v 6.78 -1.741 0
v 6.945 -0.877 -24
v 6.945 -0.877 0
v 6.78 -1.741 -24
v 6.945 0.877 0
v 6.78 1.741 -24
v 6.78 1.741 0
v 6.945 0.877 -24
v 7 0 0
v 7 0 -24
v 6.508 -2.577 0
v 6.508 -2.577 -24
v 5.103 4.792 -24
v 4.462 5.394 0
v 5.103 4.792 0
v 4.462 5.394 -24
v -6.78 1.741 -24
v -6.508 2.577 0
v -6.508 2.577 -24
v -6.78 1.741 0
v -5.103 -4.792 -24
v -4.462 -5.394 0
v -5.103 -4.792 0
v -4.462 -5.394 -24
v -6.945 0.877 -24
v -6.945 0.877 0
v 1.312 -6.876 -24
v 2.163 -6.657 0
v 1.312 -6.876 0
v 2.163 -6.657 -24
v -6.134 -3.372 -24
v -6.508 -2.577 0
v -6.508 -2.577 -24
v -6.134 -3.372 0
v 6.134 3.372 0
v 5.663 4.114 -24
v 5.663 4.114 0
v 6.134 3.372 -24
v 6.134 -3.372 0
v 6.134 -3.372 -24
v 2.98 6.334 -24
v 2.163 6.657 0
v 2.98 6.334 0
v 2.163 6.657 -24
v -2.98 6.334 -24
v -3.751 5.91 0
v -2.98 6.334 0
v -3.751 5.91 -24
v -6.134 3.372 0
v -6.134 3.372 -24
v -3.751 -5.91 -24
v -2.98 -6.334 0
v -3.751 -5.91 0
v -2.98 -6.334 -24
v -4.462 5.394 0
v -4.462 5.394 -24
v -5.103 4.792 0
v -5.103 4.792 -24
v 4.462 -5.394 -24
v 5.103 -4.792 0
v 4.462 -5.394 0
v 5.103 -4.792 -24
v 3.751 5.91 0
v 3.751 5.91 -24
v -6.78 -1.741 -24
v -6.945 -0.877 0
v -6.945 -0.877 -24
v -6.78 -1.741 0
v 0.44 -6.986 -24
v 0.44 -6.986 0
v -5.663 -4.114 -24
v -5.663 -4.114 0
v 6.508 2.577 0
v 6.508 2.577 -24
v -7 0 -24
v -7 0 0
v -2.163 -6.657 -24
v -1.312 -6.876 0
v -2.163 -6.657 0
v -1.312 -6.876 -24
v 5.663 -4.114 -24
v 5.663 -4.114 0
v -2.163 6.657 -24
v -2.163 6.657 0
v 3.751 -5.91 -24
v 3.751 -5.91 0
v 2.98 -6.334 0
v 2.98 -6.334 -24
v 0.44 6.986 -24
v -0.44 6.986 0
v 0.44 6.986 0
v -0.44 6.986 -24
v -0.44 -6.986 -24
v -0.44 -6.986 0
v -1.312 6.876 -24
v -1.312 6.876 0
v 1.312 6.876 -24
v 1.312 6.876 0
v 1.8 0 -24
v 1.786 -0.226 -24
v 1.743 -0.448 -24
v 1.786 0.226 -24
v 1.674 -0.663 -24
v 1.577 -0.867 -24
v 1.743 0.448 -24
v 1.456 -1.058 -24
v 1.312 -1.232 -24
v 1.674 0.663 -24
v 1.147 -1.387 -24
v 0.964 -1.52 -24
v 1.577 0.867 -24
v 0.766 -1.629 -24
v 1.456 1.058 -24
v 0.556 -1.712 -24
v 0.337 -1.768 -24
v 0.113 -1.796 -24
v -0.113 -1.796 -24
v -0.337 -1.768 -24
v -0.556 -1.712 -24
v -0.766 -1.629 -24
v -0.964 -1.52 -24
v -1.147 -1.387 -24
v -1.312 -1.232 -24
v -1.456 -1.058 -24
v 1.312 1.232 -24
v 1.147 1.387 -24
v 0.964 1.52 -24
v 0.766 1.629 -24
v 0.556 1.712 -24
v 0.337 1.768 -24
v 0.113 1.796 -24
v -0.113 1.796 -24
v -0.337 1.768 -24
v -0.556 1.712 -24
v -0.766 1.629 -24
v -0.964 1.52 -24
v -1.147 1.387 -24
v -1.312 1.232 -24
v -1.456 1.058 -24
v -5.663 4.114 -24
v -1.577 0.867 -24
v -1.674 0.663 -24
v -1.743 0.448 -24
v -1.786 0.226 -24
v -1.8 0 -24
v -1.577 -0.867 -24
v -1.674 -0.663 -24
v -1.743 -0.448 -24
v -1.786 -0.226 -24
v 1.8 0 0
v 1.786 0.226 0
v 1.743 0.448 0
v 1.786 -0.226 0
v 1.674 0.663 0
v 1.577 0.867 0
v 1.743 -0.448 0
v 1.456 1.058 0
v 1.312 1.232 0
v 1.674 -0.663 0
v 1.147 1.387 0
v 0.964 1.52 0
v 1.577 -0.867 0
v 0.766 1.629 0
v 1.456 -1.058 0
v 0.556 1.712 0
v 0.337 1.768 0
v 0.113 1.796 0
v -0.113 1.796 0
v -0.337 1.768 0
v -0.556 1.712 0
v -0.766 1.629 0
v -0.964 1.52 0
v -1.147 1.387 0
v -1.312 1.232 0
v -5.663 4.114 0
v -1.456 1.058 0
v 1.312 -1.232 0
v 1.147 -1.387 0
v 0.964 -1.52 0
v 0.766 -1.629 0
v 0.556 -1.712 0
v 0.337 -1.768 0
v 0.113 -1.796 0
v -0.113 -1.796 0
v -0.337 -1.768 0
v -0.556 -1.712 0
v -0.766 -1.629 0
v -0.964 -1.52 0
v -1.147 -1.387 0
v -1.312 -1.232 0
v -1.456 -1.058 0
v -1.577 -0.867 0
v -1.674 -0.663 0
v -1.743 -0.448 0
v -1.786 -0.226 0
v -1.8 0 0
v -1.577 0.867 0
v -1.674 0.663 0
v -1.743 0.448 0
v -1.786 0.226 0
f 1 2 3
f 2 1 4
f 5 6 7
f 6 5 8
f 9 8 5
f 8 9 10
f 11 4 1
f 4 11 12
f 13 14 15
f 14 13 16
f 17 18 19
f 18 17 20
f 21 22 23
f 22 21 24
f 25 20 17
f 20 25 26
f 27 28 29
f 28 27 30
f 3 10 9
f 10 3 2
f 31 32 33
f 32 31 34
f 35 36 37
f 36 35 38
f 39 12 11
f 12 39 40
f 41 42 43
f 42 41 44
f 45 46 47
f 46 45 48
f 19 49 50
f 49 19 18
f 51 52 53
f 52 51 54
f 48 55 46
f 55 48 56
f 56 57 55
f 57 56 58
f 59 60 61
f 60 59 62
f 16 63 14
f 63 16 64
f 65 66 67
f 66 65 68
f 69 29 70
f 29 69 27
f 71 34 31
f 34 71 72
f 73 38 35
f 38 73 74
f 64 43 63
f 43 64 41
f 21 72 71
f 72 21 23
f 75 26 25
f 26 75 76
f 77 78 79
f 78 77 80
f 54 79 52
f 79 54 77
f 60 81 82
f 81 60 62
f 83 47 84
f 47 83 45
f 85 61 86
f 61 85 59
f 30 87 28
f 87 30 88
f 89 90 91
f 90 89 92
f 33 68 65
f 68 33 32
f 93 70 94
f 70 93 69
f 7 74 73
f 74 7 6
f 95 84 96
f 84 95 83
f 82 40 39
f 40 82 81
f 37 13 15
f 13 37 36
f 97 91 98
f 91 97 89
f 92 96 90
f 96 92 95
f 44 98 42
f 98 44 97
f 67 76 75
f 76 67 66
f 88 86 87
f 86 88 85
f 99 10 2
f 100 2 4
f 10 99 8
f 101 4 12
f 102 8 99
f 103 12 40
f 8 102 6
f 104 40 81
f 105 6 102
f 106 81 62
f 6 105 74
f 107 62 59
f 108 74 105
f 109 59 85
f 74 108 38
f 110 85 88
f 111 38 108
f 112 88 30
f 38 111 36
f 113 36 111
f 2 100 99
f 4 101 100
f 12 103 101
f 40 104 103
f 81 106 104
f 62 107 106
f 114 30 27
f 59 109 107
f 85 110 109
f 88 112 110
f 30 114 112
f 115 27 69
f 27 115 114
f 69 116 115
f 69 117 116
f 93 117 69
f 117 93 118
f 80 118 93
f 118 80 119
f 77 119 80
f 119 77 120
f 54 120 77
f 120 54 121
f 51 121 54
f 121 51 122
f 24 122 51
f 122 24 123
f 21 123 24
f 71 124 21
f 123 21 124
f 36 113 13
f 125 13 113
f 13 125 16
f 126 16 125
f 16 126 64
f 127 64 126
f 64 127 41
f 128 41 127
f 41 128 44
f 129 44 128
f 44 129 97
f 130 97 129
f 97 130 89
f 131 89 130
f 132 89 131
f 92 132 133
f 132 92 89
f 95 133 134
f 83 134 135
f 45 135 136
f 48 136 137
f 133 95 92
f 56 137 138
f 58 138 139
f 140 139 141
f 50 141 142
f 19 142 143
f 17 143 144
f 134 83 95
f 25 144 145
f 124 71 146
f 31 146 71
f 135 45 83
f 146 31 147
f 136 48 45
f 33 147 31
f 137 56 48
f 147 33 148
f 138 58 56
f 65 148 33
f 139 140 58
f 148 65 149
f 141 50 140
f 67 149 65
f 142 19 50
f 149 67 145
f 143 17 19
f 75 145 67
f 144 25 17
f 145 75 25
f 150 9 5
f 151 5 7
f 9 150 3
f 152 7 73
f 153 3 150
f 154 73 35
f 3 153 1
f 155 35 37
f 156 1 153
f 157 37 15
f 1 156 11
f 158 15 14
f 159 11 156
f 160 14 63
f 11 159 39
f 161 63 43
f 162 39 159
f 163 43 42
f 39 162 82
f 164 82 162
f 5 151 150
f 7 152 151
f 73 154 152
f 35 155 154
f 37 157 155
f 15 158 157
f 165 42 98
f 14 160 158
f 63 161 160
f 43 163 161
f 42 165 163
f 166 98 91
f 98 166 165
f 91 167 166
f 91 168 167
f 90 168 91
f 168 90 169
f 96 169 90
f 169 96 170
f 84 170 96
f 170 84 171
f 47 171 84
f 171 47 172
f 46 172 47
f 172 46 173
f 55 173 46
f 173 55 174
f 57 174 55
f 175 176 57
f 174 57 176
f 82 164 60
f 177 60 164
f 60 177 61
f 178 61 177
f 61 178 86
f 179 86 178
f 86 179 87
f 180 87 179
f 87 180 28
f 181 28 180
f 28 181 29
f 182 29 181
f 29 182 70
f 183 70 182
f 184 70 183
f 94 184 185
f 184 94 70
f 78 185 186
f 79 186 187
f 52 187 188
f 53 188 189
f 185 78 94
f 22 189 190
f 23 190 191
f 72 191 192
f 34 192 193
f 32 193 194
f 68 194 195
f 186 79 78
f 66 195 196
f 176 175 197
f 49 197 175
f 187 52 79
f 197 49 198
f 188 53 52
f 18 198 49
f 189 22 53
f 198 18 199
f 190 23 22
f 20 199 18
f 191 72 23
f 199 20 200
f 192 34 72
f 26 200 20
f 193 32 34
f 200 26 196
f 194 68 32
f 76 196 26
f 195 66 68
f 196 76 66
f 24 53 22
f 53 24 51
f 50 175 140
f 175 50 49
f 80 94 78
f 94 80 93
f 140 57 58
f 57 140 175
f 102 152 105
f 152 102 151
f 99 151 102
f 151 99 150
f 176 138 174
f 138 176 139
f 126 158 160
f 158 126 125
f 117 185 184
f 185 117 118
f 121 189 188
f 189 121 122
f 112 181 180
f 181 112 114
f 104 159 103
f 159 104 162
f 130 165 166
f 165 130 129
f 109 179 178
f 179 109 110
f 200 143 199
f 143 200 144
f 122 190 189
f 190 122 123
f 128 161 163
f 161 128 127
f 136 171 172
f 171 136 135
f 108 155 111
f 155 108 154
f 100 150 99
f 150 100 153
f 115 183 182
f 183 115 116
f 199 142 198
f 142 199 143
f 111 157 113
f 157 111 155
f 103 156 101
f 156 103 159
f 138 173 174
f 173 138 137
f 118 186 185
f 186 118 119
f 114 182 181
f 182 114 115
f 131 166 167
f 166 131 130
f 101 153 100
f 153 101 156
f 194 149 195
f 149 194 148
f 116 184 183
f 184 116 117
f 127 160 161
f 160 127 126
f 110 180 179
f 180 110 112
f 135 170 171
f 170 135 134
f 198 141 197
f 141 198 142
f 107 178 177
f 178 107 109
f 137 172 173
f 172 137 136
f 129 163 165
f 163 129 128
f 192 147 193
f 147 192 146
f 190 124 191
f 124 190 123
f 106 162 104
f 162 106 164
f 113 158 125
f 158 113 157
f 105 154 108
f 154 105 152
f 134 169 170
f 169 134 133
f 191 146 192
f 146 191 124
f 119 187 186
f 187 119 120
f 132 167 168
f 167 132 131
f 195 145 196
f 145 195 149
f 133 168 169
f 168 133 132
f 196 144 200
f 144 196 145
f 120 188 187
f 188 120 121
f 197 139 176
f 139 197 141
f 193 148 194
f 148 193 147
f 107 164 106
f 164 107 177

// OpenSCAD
$fn = 50;


difference() {
	union() {
		translate(v = [0, 0, -24.0000000000]) {
			cylinder(h = 24, r = 7.0000000000);
		}
		cylinder(h = 0, r = 16.0000000000);
	}
	union() {
		#translate(v = [0, 0, -24]) {
			cylinder(h = 24, r = 1.8000000000);
		}
	}
}
